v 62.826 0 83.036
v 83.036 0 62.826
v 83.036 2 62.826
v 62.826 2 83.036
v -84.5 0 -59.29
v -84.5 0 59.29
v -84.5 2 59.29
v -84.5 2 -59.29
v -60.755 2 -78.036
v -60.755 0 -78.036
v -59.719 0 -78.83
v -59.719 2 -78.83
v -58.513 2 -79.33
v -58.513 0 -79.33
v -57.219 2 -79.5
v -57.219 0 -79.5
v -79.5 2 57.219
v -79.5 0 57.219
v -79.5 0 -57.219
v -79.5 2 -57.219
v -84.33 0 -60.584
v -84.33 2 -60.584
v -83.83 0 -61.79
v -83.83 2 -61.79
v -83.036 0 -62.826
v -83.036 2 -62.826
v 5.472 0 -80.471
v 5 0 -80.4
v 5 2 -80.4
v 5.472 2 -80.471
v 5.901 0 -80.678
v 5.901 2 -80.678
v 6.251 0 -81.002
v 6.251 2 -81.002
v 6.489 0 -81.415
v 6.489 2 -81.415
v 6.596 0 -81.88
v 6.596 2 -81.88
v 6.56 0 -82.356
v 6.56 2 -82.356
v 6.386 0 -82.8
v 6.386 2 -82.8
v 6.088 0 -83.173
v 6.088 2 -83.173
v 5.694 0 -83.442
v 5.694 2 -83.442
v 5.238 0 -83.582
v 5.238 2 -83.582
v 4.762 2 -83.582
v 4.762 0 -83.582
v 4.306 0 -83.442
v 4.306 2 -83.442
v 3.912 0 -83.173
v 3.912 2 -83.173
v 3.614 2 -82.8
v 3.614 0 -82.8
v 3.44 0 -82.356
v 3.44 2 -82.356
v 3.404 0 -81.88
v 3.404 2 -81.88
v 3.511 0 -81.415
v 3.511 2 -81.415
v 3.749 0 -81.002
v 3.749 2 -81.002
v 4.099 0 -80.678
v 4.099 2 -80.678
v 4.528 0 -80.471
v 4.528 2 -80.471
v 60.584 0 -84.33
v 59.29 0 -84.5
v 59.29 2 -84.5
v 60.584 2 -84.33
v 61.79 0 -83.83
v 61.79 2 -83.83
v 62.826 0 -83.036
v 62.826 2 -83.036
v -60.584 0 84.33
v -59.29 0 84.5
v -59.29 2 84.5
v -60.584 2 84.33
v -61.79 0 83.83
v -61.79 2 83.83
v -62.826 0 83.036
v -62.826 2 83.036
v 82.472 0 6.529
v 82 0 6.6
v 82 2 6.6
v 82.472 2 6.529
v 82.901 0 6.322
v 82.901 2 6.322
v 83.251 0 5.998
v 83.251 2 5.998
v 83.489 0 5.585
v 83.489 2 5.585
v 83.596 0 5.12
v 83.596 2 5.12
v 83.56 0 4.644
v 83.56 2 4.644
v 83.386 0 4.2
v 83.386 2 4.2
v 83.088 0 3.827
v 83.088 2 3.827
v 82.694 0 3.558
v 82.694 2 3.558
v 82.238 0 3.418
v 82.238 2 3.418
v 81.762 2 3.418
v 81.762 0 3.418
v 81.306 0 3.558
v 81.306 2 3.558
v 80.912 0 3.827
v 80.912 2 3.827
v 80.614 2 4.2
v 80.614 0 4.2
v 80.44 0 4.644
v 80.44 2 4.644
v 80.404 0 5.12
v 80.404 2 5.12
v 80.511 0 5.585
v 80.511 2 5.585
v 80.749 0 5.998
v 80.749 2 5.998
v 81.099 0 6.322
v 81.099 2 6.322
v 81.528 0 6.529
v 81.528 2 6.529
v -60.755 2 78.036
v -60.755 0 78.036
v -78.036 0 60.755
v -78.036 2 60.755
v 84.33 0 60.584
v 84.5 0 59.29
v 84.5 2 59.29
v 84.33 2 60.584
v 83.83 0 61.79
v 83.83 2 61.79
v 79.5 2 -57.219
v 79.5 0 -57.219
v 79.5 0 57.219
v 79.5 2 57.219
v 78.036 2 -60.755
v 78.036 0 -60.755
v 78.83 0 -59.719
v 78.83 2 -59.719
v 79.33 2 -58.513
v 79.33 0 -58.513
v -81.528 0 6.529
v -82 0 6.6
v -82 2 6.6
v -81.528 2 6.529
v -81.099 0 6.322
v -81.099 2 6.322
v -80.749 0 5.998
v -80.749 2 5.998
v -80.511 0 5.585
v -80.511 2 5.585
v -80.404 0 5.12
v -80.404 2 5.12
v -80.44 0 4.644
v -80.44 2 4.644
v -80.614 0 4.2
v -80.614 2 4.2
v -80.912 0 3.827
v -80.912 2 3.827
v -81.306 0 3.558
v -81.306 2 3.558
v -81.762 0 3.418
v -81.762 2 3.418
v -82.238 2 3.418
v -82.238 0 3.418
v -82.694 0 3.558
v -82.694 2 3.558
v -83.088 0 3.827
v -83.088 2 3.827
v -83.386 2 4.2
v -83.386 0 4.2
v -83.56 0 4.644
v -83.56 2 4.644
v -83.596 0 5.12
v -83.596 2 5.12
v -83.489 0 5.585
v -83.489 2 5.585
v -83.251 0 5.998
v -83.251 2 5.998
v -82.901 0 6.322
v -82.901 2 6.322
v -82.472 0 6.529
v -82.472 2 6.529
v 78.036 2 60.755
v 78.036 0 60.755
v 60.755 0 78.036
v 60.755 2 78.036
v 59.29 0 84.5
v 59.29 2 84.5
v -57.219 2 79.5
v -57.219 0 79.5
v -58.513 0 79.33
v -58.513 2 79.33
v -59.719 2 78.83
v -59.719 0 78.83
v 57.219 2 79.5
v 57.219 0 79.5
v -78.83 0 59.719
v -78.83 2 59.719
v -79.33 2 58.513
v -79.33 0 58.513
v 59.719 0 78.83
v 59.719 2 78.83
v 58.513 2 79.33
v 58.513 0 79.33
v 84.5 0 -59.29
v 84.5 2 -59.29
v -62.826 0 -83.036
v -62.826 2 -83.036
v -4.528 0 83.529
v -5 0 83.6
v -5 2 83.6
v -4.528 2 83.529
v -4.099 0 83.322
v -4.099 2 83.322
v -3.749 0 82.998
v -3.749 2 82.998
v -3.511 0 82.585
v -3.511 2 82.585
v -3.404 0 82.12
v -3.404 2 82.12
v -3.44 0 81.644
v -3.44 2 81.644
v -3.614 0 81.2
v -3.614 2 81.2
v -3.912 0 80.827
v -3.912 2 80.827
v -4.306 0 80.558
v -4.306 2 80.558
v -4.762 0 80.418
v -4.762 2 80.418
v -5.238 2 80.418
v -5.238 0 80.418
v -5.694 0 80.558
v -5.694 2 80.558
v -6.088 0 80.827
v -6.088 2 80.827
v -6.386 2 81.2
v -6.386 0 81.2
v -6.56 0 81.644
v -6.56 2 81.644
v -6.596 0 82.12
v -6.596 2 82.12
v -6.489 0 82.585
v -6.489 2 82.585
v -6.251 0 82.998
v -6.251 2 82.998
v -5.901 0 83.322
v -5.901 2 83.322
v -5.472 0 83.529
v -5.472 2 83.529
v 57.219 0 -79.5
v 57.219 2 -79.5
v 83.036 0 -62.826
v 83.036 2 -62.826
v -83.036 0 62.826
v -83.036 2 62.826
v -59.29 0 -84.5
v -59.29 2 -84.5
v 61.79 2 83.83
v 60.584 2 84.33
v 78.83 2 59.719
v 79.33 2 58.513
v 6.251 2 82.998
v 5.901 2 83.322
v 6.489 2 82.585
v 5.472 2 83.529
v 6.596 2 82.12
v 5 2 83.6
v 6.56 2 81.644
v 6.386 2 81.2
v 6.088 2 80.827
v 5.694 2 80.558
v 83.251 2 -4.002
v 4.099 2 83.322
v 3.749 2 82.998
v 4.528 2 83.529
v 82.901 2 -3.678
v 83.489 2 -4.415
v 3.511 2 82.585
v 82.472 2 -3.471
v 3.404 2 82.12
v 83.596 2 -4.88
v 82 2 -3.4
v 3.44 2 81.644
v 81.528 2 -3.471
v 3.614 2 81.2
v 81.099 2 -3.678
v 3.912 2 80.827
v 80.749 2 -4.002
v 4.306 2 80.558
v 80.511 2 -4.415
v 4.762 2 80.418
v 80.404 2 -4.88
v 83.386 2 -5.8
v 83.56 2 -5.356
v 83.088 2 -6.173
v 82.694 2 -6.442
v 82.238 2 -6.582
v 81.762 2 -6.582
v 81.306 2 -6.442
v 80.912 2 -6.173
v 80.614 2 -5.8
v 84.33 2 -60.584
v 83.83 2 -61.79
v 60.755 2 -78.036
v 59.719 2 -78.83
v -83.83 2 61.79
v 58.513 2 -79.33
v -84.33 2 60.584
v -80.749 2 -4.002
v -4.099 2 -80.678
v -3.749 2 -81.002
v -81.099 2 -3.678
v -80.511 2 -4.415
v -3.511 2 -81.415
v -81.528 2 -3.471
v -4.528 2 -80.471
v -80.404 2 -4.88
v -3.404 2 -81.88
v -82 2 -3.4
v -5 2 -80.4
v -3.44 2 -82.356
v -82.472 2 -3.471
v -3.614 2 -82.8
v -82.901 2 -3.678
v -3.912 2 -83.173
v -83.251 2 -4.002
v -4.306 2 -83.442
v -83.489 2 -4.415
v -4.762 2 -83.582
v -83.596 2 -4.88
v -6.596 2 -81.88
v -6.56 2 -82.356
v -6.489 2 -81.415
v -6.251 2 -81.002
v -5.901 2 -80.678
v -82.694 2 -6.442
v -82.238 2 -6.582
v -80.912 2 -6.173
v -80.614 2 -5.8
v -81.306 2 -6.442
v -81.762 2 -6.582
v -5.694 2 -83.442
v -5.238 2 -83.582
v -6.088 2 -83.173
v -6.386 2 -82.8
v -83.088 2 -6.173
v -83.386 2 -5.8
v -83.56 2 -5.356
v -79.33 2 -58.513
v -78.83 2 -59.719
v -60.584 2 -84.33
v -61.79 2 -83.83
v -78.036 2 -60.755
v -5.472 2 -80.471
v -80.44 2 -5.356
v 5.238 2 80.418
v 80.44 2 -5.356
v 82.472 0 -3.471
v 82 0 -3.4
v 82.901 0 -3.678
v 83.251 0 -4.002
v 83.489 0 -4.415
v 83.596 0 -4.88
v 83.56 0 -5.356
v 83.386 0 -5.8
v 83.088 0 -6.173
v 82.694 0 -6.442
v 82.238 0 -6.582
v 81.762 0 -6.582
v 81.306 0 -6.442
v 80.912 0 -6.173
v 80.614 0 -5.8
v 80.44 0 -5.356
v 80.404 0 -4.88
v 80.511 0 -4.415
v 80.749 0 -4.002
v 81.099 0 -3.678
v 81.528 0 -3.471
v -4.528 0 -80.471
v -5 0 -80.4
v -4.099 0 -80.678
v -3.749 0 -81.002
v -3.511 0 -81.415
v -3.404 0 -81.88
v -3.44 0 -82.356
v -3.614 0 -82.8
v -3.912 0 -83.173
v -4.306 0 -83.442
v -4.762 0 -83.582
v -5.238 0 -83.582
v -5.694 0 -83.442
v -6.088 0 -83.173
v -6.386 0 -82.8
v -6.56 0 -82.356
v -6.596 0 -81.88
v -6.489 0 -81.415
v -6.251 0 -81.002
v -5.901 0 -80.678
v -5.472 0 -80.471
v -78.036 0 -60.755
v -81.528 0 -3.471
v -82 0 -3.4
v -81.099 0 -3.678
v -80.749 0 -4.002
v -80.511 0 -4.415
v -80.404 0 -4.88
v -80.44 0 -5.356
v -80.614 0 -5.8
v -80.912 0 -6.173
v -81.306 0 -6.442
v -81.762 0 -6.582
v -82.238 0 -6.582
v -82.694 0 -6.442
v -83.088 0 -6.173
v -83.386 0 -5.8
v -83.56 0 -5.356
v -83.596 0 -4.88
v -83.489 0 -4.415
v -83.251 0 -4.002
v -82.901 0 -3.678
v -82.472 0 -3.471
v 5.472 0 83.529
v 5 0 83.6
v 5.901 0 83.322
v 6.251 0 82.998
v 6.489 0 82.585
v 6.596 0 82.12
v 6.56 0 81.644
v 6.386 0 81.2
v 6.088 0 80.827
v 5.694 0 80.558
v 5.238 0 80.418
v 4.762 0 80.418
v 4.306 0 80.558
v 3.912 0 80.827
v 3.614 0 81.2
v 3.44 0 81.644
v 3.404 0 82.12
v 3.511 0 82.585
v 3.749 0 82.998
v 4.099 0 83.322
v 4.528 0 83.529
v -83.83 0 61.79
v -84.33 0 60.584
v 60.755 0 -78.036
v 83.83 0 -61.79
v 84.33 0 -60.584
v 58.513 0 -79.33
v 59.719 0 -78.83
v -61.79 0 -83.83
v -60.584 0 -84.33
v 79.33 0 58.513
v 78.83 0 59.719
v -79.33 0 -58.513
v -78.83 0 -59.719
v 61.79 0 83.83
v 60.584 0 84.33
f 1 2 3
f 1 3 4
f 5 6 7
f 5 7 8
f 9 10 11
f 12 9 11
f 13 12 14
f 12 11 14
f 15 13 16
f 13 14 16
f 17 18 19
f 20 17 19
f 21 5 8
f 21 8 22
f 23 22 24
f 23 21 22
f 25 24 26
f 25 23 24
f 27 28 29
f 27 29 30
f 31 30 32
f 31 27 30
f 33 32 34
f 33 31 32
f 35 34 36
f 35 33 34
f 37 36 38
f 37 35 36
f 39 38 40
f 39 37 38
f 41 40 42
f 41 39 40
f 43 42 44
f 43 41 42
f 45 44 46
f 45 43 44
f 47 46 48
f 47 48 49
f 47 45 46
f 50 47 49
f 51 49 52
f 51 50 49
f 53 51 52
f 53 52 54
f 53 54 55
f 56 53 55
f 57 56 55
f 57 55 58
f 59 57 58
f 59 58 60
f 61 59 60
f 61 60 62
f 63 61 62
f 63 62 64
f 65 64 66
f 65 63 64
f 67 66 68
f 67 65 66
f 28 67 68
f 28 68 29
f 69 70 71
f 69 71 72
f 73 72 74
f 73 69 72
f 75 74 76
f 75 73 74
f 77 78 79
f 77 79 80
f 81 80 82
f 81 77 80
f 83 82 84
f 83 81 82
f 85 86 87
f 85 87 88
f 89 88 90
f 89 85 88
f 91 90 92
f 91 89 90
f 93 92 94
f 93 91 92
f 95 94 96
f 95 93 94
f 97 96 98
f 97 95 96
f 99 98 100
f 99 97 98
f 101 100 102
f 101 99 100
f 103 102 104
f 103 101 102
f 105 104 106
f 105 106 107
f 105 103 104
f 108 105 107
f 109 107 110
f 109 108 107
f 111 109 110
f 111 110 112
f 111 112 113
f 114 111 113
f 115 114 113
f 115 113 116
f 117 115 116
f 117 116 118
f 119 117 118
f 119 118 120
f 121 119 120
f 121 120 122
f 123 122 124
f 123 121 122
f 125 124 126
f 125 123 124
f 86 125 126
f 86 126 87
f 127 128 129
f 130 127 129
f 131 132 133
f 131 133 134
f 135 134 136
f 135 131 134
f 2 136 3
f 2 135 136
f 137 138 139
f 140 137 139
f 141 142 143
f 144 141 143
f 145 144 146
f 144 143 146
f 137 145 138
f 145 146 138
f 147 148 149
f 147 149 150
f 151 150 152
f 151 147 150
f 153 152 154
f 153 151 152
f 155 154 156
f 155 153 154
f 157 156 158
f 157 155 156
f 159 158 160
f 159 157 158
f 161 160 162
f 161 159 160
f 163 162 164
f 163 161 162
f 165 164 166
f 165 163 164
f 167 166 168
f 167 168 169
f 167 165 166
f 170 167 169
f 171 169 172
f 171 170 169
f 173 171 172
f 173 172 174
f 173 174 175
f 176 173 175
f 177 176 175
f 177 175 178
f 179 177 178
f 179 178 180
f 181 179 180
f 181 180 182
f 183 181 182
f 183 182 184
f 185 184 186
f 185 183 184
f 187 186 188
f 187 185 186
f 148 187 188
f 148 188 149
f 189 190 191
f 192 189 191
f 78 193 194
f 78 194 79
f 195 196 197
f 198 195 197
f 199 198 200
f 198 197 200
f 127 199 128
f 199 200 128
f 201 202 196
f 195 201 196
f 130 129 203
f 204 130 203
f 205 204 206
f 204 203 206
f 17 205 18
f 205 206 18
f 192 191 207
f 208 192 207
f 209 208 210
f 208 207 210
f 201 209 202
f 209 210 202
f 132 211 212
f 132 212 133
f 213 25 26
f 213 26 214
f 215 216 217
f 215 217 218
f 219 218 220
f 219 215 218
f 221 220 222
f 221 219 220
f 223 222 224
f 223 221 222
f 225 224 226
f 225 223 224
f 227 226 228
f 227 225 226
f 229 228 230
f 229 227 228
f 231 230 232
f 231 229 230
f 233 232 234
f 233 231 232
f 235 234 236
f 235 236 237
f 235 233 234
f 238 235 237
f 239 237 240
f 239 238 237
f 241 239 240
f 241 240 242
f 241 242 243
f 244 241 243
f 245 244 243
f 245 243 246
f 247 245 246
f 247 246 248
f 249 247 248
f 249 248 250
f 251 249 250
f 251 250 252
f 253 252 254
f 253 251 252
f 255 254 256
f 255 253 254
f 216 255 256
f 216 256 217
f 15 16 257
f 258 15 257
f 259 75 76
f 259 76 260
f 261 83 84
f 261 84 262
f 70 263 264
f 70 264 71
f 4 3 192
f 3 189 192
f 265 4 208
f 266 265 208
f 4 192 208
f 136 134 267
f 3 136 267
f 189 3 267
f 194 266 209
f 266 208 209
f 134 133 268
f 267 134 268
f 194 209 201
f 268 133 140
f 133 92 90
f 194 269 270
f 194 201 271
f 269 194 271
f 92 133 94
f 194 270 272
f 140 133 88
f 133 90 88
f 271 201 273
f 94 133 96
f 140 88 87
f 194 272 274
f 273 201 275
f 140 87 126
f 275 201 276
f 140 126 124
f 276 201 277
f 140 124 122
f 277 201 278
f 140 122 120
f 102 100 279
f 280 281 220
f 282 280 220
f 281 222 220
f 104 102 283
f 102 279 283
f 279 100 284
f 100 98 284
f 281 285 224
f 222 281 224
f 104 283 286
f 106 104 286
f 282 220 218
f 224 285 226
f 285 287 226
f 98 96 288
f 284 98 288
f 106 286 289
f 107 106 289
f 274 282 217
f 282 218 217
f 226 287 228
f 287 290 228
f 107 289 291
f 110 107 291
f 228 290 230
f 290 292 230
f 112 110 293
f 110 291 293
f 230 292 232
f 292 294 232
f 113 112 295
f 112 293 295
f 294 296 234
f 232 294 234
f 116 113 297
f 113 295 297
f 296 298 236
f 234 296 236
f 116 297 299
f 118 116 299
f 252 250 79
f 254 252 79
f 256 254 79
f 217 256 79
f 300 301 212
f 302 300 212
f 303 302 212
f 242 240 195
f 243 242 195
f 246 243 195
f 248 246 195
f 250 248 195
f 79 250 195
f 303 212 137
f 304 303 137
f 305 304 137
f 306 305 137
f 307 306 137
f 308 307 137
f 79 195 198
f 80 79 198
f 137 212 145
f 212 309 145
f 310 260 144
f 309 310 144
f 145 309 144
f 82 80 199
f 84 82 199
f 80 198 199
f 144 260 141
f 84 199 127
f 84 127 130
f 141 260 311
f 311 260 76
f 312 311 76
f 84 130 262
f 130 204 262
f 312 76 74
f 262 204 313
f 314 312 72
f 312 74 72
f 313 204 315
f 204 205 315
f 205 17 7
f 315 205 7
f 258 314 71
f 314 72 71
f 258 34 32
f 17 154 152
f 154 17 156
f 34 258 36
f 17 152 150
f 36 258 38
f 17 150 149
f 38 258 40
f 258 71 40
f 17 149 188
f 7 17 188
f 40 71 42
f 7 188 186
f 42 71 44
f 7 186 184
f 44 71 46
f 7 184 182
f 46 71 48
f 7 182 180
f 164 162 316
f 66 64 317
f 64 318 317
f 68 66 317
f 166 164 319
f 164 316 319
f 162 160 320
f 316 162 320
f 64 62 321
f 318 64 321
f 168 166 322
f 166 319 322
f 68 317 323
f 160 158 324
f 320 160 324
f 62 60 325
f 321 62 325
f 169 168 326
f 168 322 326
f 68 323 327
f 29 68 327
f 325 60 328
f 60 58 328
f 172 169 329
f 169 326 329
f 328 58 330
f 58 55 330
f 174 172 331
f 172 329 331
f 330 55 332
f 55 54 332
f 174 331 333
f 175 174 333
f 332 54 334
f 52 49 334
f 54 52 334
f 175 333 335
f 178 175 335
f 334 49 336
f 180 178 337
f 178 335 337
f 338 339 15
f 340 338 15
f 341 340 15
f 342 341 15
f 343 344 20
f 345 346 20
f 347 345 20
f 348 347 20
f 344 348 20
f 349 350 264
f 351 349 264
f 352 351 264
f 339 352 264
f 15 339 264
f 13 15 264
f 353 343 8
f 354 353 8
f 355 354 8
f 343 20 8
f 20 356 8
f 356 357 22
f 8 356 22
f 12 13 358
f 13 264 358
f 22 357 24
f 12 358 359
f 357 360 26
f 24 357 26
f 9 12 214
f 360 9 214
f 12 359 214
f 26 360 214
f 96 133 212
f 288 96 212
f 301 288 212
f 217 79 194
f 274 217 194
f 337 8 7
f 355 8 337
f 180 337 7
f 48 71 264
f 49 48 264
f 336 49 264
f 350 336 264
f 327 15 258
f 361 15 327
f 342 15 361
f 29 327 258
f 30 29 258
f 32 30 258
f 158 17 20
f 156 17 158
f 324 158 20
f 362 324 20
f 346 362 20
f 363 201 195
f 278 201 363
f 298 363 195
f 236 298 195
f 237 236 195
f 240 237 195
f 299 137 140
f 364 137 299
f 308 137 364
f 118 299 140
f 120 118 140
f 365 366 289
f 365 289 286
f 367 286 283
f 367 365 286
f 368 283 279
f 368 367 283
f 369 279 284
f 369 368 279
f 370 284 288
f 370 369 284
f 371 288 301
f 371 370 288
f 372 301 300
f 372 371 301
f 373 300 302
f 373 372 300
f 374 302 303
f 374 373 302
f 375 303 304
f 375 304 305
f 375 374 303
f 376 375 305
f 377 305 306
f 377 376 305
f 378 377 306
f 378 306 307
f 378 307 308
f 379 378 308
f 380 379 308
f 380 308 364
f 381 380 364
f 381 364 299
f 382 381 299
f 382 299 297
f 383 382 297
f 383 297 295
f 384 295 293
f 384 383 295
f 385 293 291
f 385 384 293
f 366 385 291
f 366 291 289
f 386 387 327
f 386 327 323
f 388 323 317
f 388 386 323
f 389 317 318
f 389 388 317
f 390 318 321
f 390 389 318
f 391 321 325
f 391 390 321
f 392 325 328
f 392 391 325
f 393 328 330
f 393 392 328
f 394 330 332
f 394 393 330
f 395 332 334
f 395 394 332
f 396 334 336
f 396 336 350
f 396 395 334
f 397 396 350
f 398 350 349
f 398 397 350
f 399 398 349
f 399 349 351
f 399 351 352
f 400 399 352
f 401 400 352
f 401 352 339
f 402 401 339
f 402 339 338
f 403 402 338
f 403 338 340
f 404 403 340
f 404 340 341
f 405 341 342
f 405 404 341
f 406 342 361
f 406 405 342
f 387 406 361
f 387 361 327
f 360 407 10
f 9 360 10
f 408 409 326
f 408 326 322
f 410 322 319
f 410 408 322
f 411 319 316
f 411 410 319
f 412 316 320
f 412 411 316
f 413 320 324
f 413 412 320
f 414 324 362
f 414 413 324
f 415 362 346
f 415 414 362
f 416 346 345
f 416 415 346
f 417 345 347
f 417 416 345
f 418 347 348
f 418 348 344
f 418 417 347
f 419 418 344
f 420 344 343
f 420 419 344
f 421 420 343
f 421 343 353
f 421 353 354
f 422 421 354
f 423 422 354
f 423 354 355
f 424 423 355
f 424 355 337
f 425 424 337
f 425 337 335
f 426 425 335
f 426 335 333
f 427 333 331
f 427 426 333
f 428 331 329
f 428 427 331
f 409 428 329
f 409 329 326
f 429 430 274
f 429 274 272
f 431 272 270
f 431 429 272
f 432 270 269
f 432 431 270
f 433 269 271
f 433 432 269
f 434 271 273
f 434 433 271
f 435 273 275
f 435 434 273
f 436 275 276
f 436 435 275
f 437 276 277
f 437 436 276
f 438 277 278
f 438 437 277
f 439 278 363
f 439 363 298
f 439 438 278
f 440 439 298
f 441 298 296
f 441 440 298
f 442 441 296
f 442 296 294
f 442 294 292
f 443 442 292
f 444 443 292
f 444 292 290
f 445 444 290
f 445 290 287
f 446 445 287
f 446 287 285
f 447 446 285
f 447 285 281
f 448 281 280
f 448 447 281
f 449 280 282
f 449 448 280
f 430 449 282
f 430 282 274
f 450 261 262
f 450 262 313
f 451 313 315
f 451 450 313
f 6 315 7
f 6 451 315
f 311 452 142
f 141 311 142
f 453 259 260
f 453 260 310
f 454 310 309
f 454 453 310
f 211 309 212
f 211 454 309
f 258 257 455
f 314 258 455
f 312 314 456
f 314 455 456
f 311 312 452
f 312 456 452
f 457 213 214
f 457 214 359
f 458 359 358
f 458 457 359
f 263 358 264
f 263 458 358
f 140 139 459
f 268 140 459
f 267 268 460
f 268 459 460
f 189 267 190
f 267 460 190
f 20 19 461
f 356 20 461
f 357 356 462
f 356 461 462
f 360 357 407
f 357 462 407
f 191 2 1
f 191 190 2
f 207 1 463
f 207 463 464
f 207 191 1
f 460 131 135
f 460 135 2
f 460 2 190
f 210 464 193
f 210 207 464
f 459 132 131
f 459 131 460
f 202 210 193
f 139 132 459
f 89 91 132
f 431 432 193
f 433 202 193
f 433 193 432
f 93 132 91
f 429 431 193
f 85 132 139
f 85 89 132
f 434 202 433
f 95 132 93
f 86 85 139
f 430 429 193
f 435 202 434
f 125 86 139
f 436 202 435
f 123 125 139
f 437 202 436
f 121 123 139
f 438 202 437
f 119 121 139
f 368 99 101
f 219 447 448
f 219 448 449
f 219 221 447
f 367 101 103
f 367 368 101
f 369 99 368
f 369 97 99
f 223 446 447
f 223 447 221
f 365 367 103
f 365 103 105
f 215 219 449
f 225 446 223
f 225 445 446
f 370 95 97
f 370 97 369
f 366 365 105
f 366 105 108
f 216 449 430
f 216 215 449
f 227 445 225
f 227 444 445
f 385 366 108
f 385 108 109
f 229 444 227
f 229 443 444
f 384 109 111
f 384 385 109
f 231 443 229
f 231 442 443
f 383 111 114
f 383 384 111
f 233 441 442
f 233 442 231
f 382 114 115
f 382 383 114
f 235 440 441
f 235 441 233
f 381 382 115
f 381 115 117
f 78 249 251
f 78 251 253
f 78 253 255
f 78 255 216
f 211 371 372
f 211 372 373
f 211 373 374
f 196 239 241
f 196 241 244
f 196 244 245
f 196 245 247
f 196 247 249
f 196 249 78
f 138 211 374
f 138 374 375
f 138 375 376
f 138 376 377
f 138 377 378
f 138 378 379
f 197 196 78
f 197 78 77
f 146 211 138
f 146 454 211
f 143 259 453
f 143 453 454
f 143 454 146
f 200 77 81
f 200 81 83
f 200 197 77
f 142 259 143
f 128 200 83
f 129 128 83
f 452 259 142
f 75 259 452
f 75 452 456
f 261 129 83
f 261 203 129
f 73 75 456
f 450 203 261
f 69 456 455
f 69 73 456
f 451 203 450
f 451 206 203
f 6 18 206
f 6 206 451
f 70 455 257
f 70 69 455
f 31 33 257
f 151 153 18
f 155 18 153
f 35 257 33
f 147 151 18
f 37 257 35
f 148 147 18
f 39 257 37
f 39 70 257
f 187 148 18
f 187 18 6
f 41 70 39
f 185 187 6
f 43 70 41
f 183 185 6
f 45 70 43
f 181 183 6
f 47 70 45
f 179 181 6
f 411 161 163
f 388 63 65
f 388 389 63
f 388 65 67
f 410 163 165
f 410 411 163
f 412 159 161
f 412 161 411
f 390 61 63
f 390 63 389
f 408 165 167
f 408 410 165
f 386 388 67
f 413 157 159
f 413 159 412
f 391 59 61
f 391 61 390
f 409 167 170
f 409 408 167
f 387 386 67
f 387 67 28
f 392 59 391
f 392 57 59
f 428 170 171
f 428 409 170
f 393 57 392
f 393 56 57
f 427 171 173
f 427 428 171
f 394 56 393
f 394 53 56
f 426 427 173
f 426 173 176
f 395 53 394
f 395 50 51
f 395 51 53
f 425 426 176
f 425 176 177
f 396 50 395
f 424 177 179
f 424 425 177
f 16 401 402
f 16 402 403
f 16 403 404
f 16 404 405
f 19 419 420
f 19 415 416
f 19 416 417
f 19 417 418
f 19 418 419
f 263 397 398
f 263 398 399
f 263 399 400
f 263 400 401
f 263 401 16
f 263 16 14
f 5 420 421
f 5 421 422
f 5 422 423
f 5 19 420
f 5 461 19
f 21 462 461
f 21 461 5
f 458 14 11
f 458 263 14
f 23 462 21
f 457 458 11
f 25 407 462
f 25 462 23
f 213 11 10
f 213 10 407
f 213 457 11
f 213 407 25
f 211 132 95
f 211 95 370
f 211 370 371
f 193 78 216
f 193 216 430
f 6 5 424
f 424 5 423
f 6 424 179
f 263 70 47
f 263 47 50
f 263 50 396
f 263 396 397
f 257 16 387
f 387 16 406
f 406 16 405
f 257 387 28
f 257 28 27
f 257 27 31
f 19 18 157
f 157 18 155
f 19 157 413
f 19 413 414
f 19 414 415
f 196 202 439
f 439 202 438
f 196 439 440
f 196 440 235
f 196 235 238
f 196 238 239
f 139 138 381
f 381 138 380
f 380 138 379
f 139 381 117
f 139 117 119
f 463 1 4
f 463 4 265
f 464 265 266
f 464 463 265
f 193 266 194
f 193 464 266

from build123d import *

# Parameters (mm, degrees)
SKETCH_1_R      = 1.6
EXTRUDE_1_DEPTH = 2


with BuildPart() as part:
    # 草图1 → 凸台-拉伸1 (new body)
    with BuildSketch(Plane(origin=(0, 0, 0), x_dir=(1, 0, 0), z_dir=(0, 1, 0))):
        with BuildLine():
            Line((0, 84.5), (59.290367902, 84.5))
            ThreePointArc((59.290367902, 84.5), (61.203785064, 84.119397663), (62.825901808, 83.035533906))
            Line((62.825901808, 83.035533906), (83.035533906, 62.825901808))
            ThreePointArc((83.035533906, 62.825901808), (84.119397663, 61.203785064), (84.5, 59.290367902))
            Line((84.5, 59.290367902), (84.5, 0))
            Line((84.5, 0), (84.5, -59.290367902))
            ThreePointArc((84.5, -59.290367902), (84.119397663, -61.203785064), (83.035533906, -62.825901808))
            Line((83.035533906, -62.825901808), (62.825901808, -83.035533906))
            ThreePointArc((62.825901808, -83.035533906), (61.203785064, -84.119397663), (59.290367902, -84.5))
            Line((59.290367902, -84.5), (0, -84.5))
            Line((0, -84.5), (-59.290367902, -84.5))
            ThreePointArc((-59.290367902, -84.5), (-61.203785064, -84.119397663), (-62.825901808, -83.035533906))
            Line((-62.825901808, -83.035533906), (-83.035533906, -62.825901808))
            ThreePointArc((-83.035533906, -62.825901808), (-84.119397663, -61.203785064), (-84.5, -59.290367902))
            Line((-84.5, -59.290367902), (-84.5, -1.780508218))
            Line((-84.5, -1.780508218), (-84.5, 59.290367902))
            ThreePointArc((-84.5, 59.290367902), (-84.119397663, 61.203785064), (-83.035533906, 62.825901808))
            Line((-83.035533906, 62.825901808), (-62.825901808, 83.035533906))
            ThreePointArc((-62.825901808, 83.035533906), (-61.203785064, 84.119397663), (-59.290367902, 84.5))
            Line((-59.290367902, 84.5), (0, 84.5))
        make_face()
        with Locations(Location((5, 82, 0), (0, 0, 270))):
            Circle(SKETCH_1_R, mode=Mode.SUBTRACT)
        with Locations(Location((-5, 82, 0), (0, 0, 270))):
            Circle(SKETCH_1_R, mode=Mode.SUBTRACT)
        with Locations(Location((82, 5, 0), (0, 0, 270))):
            Circle(SKETCH_1_R, mode=Mode.SUBTRACT)
        with Locations(Location((82, -5, 0), (0, 0, 270))):
            Circle(SKETCH_1_R, mode=Mode.SUBTRACT)
        with Locations(Location((5, -82, 0), (0, 0, 270))):
            Circle(SKETCH_1_R, mode=Mode.SUBTRACT)
        with Locations(Location((-5, -82, 0), (0, 0, 270))):
            Circle(SKETCH_1_R, mode=Mode.SUBTRACT)
        with Locations(Location((-82, -5, 0), (0, 0, 270))):
            Circle(SKETCH_1_R, mode=Mode.SUBTRACT)
        with Locations(Location((-82, 5, 0), (0, 0, 270))):
            Circle(SKETCH_1_R, mode=Mode.SUBTRACT)
        with BuildLine():
            Line((0, 79.5), (57.21930009, 79.5))
            ThreePointArc((57.21930009, 79.5), (59.132717252, 79.119397663), (60.754833996, 78.035533906))
            Line((60.754833996, 78.035533906), (78.035533906, 60.754833996))
            ThreePointArc((78.035533906, 60.754833996), (79.119397663, 59.132717252), (79.5, 57.21930009))
            Line((79.5, 57.21930009), (79.5, 0))
            Line((79.5, 0), (79.5, -57.21930009))
            ThreePointArc((79.5, -57.21930009), (79.119397663, -59.132717252), (78.035533906, -60.754833996))
            Line((78.035533906, -60.754833996), (60.754833996, -78.035533906))
            ThreePointArc((60.754833996, -78.035533906), (59.132717252, -79.119397663), (57.21930009, -79.5))
            Line((57.21930009, -79.5), (0, -79.5))
            Line((0, -79.5), (-57.21930009, -79.5))
            ThreePointArc((-57.21930009, -79.5), (-59.132717252, -79.119397663), (-60.754833996, -78.035533906))
            Line((-60.754833996, -78.035533906), (-78.035533906, -60.754833996))
            ThreePointArc((-78.035533906, -60.754833996), (-79.119397663, -59.132717252), (-79.5, -57.21930009))
            Line((-79.5, -57.21930009), (-79.5, -1.165353087))
            Line((-79.5, -1.165353087), (-79.5, 57.21930009))
            ThreePointArc((-79.5, 57.21930009), (-79.119397663, 59.132717252), (-78.035533906, 60.754833996))
            Line((-78.035533906, 60.754833996), (-60.754833996, 78.035533906))
            ThreePointArc((-60.754833996, 78.035533906), (-59.132717252, 79.119397663), (-57.21930009, 79.5))
            Line((-57.21930009, 79.5), (0, 79.5))
        make_face(mode=Mode.SUBTRACT)
    extrude(amount=EXTRUDE_1_DEPTH)


solid = part.part
